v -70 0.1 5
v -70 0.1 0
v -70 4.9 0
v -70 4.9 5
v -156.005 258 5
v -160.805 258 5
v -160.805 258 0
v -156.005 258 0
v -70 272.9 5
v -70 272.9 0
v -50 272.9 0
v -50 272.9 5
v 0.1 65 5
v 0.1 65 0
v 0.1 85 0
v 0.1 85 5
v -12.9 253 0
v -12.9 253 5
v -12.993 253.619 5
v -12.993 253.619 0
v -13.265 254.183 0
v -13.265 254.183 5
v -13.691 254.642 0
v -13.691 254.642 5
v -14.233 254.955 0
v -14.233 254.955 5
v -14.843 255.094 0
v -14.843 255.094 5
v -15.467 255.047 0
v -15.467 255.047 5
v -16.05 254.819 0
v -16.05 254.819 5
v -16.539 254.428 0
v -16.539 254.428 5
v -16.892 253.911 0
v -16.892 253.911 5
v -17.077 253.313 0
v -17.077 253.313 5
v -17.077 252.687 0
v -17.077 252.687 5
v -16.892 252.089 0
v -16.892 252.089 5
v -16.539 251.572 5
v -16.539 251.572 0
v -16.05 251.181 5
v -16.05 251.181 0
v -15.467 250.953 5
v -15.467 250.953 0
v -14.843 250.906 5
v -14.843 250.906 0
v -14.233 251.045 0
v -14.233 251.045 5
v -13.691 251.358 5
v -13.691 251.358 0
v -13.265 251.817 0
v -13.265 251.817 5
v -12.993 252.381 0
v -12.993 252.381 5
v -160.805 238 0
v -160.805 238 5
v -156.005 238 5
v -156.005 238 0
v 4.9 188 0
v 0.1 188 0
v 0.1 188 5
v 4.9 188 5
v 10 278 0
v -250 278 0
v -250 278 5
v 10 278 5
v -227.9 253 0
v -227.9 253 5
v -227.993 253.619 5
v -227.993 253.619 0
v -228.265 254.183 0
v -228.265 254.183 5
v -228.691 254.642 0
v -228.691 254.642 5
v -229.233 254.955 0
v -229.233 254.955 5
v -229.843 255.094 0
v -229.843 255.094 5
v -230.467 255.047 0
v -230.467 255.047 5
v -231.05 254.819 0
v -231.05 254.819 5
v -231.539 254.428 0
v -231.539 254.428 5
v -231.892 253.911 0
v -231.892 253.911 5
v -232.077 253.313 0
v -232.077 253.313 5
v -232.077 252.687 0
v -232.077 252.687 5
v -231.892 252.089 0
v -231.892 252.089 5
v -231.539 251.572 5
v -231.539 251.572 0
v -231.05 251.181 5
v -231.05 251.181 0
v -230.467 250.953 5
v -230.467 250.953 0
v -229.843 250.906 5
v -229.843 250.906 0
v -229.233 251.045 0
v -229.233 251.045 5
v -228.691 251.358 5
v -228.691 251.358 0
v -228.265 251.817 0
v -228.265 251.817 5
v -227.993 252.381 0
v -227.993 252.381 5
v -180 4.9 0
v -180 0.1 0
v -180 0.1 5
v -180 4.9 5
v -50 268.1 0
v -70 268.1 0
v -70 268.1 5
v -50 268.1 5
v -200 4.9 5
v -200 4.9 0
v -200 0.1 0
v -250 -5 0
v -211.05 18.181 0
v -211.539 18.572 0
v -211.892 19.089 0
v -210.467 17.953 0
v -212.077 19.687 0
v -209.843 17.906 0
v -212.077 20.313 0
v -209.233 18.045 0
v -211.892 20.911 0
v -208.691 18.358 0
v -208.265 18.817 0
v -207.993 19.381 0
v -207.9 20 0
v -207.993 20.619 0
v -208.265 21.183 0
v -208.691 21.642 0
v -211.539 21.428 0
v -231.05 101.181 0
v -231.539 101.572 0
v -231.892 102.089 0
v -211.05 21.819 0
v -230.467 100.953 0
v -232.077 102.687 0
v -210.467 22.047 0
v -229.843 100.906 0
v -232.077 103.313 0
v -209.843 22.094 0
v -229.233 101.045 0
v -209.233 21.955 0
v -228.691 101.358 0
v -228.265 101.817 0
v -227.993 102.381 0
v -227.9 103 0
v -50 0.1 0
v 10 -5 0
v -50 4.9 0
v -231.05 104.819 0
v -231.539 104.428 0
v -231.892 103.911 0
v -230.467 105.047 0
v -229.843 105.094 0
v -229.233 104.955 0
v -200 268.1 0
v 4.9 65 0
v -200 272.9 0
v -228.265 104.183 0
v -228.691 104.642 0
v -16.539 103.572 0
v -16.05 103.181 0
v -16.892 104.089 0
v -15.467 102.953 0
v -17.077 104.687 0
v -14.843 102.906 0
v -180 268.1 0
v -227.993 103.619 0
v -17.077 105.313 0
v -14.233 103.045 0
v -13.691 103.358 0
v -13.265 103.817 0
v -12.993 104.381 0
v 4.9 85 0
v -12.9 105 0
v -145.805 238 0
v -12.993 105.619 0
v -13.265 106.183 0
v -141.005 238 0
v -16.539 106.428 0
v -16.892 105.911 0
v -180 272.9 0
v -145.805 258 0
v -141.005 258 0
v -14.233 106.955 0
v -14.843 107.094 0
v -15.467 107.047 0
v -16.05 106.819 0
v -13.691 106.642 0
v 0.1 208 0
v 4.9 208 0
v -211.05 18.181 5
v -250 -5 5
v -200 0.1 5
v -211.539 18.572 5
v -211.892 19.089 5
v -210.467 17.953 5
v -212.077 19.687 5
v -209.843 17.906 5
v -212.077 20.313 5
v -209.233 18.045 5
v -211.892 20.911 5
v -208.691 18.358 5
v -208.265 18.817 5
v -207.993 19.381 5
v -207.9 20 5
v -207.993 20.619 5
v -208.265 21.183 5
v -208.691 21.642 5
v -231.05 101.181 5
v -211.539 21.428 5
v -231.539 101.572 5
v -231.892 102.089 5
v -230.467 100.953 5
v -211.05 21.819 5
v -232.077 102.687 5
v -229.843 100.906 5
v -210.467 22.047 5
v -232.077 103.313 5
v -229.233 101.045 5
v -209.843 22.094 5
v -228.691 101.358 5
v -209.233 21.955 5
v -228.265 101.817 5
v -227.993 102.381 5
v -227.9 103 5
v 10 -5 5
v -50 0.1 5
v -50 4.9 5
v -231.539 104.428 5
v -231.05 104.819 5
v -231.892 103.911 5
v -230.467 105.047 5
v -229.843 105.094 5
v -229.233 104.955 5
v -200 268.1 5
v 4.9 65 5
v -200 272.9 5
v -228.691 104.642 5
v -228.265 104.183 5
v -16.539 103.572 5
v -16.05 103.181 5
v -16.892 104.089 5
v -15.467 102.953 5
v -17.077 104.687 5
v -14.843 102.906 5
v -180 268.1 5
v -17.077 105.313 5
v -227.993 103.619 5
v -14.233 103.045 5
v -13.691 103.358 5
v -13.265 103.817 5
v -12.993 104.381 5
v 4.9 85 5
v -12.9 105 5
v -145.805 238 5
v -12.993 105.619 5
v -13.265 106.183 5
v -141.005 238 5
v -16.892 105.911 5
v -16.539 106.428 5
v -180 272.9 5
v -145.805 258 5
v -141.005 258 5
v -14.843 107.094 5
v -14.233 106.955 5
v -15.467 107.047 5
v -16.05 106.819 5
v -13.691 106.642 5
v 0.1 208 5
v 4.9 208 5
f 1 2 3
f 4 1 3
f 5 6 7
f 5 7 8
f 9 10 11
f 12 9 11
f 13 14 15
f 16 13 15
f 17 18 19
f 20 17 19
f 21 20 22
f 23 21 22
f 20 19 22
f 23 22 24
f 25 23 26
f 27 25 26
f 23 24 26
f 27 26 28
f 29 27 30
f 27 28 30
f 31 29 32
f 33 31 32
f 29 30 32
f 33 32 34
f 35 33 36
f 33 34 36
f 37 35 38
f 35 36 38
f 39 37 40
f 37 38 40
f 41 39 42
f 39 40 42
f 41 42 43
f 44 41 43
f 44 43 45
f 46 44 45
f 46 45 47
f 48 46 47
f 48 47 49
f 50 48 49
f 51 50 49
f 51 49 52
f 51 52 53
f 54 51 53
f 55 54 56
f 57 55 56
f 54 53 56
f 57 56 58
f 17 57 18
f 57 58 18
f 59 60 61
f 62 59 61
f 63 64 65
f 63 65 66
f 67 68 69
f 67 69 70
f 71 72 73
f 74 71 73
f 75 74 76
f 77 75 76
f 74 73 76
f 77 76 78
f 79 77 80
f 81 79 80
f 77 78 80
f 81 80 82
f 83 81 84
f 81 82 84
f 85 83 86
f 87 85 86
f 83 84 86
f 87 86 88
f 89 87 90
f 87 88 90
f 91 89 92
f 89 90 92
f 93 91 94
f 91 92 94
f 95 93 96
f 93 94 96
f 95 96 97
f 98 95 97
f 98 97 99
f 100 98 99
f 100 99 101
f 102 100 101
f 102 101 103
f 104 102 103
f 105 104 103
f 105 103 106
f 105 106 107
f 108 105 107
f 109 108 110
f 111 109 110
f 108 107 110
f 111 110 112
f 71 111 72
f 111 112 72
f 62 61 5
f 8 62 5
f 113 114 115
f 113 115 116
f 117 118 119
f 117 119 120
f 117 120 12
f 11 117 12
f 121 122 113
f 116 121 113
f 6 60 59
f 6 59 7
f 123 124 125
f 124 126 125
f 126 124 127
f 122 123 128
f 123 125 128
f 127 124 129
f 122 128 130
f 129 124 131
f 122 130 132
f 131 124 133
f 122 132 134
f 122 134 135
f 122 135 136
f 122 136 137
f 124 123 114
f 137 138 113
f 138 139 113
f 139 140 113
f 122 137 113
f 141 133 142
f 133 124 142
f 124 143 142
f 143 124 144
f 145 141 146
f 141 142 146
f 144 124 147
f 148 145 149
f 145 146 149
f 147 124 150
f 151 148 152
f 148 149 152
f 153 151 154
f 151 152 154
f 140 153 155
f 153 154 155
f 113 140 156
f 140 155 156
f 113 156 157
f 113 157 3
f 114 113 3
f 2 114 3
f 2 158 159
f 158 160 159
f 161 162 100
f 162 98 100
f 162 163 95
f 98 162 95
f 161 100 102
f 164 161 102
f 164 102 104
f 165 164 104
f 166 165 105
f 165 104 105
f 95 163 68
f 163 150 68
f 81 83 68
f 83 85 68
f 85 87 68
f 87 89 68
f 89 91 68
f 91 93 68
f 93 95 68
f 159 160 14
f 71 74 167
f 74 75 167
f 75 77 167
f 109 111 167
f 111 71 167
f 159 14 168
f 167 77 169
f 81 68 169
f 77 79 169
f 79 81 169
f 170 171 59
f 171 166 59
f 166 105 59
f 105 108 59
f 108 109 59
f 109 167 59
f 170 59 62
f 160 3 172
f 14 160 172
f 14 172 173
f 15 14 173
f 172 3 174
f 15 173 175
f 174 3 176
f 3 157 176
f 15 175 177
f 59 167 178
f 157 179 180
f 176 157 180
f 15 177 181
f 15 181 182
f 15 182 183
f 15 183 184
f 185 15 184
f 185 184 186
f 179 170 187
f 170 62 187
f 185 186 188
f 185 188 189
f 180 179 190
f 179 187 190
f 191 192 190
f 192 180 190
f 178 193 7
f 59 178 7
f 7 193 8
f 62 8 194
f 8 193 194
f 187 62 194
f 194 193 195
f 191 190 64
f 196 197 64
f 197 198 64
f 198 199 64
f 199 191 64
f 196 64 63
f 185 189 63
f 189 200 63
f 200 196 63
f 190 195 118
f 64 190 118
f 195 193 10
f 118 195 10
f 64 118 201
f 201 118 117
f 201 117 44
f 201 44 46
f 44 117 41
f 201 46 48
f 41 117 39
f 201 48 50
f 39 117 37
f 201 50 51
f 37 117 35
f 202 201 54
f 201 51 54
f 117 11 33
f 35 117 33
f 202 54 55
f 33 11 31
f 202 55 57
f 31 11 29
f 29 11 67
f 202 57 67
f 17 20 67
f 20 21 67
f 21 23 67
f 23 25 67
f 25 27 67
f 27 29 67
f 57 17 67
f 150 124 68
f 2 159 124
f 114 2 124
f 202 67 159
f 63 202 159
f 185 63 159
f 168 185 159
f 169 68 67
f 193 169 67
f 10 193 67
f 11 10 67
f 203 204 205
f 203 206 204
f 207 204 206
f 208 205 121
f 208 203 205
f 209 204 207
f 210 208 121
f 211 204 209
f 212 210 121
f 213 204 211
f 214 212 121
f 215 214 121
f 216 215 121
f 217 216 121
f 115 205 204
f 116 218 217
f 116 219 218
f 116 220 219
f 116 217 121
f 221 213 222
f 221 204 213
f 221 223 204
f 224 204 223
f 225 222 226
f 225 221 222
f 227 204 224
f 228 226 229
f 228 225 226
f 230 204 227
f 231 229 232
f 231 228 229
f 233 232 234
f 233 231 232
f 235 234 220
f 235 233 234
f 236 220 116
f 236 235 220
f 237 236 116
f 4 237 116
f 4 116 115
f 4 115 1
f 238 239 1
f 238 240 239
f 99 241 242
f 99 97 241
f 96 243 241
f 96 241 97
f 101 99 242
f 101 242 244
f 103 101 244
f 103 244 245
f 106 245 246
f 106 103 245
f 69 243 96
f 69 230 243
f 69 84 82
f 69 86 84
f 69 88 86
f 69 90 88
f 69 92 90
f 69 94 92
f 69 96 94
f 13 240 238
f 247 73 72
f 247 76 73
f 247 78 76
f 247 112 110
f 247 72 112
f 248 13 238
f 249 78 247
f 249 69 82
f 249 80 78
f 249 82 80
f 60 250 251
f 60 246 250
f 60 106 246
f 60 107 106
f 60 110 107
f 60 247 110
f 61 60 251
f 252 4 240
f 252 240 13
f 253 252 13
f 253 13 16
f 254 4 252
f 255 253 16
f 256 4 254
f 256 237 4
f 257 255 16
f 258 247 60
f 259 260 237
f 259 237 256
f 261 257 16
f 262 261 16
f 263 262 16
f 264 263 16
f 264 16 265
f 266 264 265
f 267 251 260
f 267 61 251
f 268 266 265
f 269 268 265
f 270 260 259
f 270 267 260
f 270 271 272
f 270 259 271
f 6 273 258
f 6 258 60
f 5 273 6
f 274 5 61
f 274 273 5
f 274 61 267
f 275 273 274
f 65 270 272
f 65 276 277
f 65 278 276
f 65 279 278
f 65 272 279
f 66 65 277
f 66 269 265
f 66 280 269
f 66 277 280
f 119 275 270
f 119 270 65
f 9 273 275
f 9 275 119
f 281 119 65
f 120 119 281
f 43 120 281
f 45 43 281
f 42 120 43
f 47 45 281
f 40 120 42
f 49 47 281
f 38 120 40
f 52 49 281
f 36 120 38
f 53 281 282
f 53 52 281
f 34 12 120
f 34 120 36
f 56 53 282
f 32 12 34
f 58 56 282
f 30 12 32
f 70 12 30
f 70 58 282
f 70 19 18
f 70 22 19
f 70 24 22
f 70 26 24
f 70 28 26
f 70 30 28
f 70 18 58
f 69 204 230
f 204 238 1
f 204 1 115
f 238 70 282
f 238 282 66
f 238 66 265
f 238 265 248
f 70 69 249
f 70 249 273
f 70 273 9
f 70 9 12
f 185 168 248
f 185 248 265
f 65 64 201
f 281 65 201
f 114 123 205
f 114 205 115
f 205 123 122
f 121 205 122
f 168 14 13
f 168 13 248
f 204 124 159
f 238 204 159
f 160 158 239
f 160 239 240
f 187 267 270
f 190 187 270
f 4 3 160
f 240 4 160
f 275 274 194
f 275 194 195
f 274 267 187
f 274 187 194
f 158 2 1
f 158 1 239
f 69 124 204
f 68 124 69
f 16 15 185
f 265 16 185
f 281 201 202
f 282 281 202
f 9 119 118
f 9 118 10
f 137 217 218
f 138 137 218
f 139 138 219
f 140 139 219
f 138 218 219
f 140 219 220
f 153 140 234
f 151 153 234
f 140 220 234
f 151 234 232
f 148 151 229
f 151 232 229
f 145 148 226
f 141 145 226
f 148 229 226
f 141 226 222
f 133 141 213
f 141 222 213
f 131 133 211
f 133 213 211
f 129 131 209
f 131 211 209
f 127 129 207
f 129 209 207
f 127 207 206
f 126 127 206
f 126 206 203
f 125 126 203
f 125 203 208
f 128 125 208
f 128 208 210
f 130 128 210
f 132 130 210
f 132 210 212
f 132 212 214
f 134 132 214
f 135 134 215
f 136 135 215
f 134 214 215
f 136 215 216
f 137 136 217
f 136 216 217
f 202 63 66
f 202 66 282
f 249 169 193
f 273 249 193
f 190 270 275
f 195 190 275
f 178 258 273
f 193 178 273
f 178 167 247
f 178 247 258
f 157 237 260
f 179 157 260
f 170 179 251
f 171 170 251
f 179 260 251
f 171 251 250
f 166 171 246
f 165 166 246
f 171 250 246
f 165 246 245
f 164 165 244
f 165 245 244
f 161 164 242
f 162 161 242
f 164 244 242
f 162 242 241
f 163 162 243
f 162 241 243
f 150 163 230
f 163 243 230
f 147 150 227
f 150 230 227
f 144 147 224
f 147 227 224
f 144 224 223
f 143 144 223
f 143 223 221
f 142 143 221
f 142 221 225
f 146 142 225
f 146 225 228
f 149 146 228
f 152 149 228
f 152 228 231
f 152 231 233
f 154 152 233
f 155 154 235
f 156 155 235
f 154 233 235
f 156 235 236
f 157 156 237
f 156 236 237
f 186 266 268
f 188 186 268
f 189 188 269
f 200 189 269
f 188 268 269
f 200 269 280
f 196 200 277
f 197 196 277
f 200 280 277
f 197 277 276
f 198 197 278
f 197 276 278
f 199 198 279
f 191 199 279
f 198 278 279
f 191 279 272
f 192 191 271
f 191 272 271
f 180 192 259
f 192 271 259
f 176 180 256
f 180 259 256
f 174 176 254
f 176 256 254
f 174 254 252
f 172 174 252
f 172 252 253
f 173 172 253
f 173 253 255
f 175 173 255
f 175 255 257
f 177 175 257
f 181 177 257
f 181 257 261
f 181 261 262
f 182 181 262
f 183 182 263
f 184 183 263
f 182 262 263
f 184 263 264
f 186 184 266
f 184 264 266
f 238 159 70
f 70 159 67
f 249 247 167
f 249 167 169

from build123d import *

# Parameters (mm, degrees)
SKETCH1_W           = 260
SKETCH1_H           = 283
SKETCH1_W_2         = 20
SKETCH1_H_2         = 4.8
SKETCH1_W_3         = 4.8
SKETCH1_H_3         = 20
BOSS_EXTRUDE1_DEPTH = 5
SKETCH2_W           = 4.8
SKETCH2_H           = 20
CUT_EXTRUDE1_DEPTH  = 5
SKETCH3_R           = 2.1
CUT_EXTRUDE2_DEPTH  = 5
SKETCH4_R           = 2.1
CUT_EXTRUDE3_DEPTH  = 5
SKETCH5_R           = 2.1
CUT_EXTRUDE4_DEPTH  = 5
SKETCH6_R           = 2.1
CUT_EXTRUDE5_DEPTH  = 5


with BuildPart() as part:
    # Sketch1 → Boss-Extrude1 (new body)
    with BuildSketch(Plane.XY):
        with Locations((-120, 136.5)):
            Rectangle(SKETCH1_W, SKETCH1_H)
        with Locations((-190, 2.5)):
            Rectangle(SKETCH1_W_2, SKETCH1_H_2, mode=Mode.SUBTRACT)
        with Locations((-60, 2.5)):
            Rectangle(SKETCH1_W_2, SKETCH1_H_2, mode=Mode.SUBTRACT)
        with Locations((2.5, 75)):
            Rectangle(SKETCH1_W_3, SKETCH1_H_3, mode=Mode.SUBTRACT)
        with Locations((2.5, 198)):
            Rectangle(SKETCH1_W_3, SKETCH1_H_3, mode=Mode.SUBTRACT)
        with Locations((-60, 270.5)):
            Rectangle(SKETCH1_W_2, SKETCH1_H_2, mode=Mode.SUBTRACT)
        with Locations((-190, 270.5)):
            Rectangle(SKETCH1_W_2, SKETCH1_H_2, mode=Mode.SUBTRACT)
    extrude(amount=BOSS_EXTRUDE1_DEPTH)

    # Sketch2 → Cut-Extrude1 (cut)
    with BuildSketch(Plane.XY.offset(5)):
        with Locations((-143.405234687, 248)):
            Rectangle(SKETCH2_W, SKETCH2_H)
        with Locations((-158.405234687, 248)):
            Rectangle(SKETCH2_W, SKETCH2_H)
    extrude(amount=-CUT_EXTRUDE1_DEPTH, mode=Mode.SUBTRACT)

    # Sketch3 → Cut-Extrude2 (cut)
    with BuildSketch(Plane.XY.offset(5)):
        with Locations((-230, 253)):
            Circle(SKETCH3_R)
        with Locations((-15, 253)):
            Circle(SKETCH3_R)
    extrude(amount=-CUT_EXTRUDE2_DEPTH, mode=Mode.SUBTRACT)

    # Sketch4 → Cut-Extrude3 (cut)
    with BuildSketch(Plane.XY.offset(5)):
        with Locations((-210, 20)):
            Circle(SKETCH4_R)
    extrude(amount=-CUT_EXTRUDE3_DEPTH, mode=Mode.SUBTRACT)

    # Sketch5 → Cut-Extrude4 (cut)
    with BuildSketch(Plane.XY.offset(5)):
        with Locations((-15, 105)):
            Circle(SKETCH5_R)
    extrude(amount=-CUT_EXTRUDE4_DEPTH, mode=Mode.SUBTRACT)

    # Sketch6 → Cut-Extrude5 (cut)
    with BuildSketch(Plane.XY.offset(5)):
        with Locations((-230, 103)):
            Circle(SKETCH6_R)
    extrude(amount=-CUT_EXTRUDE5_DEPTH, mode=Mode.SUBTRACT)


solid = part.part
